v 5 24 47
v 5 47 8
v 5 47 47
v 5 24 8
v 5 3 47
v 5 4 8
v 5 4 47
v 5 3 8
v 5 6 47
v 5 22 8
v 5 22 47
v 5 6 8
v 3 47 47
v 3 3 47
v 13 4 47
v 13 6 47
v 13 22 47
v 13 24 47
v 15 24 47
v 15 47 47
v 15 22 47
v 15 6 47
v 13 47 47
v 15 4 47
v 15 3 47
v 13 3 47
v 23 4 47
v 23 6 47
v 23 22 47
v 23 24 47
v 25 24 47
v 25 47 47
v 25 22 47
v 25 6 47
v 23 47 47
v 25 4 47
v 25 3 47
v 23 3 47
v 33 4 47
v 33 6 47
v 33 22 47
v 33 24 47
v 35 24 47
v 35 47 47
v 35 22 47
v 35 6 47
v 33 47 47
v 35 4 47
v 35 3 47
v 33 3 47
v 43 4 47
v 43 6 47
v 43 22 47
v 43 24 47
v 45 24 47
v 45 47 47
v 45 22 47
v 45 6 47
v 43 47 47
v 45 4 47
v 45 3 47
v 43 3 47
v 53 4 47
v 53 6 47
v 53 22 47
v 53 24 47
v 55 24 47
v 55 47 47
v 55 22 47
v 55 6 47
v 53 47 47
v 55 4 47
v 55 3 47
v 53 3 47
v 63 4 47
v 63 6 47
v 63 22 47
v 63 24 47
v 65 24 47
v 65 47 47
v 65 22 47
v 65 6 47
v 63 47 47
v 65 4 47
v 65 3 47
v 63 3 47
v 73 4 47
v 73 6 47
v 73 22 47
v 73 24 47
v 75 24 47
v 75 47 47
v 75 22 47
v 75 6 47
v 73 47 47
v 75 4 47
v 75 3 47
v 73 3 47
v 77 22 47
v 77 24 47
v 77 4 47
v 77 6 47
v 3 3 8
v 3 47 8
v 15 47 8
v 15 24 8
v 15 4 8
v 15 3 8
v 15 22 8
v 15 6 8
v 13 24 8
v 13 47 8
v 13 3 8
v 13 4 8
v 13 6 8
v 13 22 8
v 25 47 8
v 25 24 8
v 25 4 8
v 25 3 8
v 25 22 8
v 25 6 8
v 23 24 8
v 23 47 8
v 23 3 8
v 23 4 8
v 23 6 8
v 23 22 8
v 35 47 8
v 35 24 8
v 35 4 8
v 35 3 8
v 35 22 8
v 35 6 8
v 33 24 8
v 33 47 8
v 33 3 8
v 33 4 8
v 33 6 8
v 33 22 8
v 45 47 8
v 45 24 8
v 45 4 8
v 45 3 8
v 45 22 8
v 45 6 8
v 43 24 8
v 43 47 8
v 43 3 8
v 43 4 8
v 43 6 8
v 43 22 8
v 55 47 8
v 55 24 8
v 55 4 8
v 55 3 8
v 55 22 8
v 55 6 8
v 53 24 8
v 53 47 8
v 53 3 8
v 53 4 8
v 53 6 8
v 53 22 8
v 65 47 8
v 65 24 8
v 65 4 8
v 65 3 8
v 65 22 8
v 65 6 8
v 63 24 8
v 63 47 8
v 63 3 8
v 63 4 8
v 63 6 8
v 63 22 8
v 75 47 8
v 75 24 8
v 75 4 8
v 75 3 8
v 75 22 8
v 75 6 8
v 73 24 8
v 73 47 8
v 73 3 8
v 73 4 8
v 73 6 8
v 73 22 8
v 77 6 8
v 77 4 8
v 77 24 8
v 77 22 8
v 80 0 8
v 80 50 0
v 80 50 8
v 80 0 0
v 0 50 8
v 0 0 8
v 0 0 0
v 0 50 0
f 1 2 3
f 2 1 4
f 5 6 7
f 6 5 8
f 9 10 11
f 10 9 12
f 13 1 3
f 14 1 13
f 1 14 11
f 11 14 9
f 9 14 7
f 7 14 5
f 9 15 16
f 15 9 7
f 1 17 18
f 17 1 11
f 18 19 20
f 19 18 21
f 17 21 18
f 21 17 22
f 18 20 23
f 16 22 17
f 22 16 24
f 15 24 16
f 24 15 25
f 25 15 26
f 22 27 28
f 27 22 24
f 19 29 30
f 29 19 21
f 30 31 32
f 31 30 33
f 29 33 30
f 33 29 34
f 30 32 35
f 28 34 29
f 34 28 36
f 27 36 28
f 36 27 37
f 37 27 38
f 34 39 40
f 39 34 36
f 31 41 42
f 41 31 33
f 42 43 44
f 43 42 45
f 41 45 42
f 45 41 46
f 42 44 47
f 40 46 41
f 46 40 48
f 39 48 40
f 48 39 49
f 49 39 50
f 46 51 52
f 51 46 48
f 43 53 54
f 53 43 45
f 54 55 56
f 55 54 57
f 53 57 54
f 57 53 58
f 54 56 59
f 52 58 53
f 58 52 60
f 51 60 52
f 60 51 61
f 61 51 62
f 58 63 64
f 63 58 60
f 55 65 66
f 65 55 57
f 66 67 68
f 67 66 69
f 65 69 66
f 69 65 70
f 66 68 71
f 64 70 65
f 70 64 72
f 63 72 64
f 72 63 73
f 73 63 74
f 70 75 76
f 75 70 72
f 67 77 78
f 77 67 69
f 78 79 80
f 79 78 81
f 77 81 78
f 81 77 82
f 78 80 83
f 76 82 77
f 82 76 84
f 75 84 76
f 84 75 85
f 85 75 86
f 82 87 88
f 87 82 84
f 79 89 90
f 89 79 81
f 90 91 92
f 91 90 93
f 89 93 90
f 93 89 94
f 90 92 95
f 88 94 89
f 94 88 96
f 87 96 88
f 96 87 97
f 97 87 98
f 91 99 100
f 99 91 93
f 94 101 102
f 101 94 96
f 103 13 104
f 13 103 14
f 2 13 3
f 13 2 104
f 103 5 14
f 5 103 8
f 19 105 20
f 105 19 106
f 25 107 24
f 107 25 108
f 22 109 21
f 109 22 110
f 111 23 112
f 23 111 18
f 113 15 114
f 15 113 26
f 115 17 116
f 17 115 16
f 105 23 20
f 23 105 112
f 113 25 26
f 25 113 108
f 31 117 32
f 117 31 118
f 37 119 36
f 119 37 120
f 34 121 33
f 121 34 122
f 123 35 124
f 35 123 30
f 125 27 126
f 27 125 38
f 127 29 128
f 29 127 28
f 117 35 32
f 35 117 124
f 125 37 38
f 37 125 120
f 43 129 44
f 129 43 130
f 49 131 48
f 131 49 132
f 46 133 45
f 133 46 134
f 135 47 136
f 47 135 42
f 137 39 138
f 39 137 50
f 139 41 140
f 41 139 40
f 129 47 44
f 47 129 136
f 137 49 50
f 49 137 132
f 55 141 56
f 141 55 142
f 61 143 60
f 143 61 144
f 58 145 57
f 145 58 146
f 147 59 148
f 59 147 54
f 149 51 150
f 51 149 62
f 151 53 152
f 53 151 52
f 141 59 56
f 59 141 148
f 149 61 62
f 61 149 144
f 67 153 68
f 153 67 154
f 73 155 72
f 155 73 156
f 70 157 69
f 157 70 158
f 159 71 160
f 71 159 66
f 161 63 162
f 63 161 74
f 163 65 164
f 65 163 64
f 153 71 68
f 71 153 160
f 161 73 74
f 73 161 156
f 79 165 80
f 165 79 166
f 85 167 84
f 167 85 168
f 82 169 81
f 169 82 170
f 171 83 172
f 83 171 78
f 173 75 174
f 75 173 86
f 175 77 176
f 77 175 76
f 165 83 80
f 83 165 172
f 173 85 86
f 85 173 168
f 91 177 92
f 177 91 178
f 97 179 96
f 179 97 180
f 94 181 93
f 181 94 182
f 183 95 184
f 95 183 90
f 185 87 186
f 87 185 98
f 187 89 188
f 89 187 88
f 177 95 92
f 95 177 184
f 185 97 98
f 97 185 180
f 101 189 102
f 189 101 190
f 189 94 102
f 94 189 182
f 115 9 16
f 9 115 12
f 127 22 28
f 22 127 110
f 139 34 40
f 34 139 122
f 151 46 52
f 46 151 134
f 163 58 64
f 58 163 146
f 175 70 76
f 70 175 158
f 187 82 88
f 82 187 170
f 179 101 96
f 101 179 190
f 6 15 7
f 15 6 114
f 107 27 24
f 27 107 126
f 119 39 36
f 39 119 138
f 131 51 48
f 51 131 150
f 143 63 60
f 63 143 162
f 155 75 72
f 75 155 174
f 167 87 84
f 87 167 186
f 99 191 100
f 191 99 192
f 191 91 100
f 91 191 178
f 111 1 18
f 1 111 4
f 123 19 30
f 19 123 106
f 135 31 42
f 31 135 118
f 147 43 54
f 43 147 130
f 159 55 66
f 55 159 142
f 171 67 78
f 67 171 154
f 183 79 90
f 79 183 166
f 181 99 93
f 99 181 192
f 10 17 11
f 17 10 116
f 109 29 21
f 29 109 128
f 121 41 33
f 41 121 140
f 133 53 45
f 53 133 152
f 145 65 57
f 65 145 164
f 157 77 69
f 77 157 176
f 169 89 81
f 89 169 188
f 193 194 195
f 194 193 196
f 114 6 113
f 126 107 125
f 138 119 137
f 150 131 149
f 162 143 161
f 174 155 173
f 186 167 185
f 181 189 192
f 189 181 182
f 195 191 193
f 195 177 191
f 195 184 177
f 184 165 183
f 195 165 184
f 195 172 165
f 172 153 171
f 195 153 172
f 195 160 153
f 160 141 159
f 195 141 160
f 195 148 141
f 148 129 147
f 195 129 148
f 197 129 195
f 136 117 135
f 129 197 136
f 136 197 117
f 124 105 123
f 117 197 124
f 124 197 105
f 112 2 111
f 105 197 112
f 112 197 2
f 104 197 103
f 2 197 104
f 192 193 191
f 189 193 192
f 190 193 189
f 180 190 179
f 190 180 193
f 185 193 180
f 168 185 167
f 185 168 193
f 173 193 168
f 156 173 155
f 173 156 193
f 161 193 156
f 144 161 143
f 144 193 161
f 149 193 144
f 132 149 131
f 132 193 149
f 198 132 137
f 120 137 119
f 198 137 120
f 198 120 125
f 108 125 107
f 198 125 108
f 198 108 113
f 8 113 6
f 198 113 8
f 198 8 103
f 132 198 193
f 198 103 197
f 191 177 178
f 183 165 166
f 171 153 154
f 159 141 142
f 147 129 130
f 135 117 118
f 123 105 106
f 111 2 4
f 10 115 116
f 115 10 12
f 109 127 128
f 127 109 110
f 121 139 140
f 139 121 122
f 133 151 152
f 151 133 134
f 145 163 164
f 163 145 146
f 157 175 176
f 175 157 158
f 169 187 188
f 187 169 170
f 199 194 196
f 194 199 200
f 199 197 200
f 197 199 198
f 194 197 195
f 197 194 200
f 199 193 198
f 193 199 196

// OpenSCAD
$fn = 32;

// ----------------------------------------------------------------------
// Heatsink: cross fin block
// ----------------------------------------------------------------------

// --- parameters (mm) ---
base_l = 80;              // base length, X
base_w = 50;              // base width, Y
base_t = 8;               // base plate thickness
fin_h = 40;               // fin height above the base
fin_t = 2;                // fin thickness
edge = 3;                 // margin from the base ends
pitch = 10;               // fin pitch
rib_pitch = 18;           // cross rib pitch
fit_tol = 0.05;           // tolerance for press fits, mm
free_tol = 0.3;           // tolerance for clearance fits, mm

n_fins = floor((base_l - 2 * edge - fin_t) / pitch) + 1;  // fin count
total_h = base_t + fin_h - 1;  // overall height
n_ribs = floor((base_w - 2 * edge) / rib_pitch);  // rib count

union() {
  cube([base_l, base_w, base_t]);
  for (i = [0 : n_fins - 1])
    translate([edge + i * pitch, edge, base_t - 1])
      cube([fin_t, base_w - 2 * edge, fin_h]);
  for (i = [0 : n_ribs - 1])
    translate([edge, edge + 1 + i * rib_pitch, base_t - 1])
      cube([base_l - 2 * edge, fin_t, fin_h]);
}
